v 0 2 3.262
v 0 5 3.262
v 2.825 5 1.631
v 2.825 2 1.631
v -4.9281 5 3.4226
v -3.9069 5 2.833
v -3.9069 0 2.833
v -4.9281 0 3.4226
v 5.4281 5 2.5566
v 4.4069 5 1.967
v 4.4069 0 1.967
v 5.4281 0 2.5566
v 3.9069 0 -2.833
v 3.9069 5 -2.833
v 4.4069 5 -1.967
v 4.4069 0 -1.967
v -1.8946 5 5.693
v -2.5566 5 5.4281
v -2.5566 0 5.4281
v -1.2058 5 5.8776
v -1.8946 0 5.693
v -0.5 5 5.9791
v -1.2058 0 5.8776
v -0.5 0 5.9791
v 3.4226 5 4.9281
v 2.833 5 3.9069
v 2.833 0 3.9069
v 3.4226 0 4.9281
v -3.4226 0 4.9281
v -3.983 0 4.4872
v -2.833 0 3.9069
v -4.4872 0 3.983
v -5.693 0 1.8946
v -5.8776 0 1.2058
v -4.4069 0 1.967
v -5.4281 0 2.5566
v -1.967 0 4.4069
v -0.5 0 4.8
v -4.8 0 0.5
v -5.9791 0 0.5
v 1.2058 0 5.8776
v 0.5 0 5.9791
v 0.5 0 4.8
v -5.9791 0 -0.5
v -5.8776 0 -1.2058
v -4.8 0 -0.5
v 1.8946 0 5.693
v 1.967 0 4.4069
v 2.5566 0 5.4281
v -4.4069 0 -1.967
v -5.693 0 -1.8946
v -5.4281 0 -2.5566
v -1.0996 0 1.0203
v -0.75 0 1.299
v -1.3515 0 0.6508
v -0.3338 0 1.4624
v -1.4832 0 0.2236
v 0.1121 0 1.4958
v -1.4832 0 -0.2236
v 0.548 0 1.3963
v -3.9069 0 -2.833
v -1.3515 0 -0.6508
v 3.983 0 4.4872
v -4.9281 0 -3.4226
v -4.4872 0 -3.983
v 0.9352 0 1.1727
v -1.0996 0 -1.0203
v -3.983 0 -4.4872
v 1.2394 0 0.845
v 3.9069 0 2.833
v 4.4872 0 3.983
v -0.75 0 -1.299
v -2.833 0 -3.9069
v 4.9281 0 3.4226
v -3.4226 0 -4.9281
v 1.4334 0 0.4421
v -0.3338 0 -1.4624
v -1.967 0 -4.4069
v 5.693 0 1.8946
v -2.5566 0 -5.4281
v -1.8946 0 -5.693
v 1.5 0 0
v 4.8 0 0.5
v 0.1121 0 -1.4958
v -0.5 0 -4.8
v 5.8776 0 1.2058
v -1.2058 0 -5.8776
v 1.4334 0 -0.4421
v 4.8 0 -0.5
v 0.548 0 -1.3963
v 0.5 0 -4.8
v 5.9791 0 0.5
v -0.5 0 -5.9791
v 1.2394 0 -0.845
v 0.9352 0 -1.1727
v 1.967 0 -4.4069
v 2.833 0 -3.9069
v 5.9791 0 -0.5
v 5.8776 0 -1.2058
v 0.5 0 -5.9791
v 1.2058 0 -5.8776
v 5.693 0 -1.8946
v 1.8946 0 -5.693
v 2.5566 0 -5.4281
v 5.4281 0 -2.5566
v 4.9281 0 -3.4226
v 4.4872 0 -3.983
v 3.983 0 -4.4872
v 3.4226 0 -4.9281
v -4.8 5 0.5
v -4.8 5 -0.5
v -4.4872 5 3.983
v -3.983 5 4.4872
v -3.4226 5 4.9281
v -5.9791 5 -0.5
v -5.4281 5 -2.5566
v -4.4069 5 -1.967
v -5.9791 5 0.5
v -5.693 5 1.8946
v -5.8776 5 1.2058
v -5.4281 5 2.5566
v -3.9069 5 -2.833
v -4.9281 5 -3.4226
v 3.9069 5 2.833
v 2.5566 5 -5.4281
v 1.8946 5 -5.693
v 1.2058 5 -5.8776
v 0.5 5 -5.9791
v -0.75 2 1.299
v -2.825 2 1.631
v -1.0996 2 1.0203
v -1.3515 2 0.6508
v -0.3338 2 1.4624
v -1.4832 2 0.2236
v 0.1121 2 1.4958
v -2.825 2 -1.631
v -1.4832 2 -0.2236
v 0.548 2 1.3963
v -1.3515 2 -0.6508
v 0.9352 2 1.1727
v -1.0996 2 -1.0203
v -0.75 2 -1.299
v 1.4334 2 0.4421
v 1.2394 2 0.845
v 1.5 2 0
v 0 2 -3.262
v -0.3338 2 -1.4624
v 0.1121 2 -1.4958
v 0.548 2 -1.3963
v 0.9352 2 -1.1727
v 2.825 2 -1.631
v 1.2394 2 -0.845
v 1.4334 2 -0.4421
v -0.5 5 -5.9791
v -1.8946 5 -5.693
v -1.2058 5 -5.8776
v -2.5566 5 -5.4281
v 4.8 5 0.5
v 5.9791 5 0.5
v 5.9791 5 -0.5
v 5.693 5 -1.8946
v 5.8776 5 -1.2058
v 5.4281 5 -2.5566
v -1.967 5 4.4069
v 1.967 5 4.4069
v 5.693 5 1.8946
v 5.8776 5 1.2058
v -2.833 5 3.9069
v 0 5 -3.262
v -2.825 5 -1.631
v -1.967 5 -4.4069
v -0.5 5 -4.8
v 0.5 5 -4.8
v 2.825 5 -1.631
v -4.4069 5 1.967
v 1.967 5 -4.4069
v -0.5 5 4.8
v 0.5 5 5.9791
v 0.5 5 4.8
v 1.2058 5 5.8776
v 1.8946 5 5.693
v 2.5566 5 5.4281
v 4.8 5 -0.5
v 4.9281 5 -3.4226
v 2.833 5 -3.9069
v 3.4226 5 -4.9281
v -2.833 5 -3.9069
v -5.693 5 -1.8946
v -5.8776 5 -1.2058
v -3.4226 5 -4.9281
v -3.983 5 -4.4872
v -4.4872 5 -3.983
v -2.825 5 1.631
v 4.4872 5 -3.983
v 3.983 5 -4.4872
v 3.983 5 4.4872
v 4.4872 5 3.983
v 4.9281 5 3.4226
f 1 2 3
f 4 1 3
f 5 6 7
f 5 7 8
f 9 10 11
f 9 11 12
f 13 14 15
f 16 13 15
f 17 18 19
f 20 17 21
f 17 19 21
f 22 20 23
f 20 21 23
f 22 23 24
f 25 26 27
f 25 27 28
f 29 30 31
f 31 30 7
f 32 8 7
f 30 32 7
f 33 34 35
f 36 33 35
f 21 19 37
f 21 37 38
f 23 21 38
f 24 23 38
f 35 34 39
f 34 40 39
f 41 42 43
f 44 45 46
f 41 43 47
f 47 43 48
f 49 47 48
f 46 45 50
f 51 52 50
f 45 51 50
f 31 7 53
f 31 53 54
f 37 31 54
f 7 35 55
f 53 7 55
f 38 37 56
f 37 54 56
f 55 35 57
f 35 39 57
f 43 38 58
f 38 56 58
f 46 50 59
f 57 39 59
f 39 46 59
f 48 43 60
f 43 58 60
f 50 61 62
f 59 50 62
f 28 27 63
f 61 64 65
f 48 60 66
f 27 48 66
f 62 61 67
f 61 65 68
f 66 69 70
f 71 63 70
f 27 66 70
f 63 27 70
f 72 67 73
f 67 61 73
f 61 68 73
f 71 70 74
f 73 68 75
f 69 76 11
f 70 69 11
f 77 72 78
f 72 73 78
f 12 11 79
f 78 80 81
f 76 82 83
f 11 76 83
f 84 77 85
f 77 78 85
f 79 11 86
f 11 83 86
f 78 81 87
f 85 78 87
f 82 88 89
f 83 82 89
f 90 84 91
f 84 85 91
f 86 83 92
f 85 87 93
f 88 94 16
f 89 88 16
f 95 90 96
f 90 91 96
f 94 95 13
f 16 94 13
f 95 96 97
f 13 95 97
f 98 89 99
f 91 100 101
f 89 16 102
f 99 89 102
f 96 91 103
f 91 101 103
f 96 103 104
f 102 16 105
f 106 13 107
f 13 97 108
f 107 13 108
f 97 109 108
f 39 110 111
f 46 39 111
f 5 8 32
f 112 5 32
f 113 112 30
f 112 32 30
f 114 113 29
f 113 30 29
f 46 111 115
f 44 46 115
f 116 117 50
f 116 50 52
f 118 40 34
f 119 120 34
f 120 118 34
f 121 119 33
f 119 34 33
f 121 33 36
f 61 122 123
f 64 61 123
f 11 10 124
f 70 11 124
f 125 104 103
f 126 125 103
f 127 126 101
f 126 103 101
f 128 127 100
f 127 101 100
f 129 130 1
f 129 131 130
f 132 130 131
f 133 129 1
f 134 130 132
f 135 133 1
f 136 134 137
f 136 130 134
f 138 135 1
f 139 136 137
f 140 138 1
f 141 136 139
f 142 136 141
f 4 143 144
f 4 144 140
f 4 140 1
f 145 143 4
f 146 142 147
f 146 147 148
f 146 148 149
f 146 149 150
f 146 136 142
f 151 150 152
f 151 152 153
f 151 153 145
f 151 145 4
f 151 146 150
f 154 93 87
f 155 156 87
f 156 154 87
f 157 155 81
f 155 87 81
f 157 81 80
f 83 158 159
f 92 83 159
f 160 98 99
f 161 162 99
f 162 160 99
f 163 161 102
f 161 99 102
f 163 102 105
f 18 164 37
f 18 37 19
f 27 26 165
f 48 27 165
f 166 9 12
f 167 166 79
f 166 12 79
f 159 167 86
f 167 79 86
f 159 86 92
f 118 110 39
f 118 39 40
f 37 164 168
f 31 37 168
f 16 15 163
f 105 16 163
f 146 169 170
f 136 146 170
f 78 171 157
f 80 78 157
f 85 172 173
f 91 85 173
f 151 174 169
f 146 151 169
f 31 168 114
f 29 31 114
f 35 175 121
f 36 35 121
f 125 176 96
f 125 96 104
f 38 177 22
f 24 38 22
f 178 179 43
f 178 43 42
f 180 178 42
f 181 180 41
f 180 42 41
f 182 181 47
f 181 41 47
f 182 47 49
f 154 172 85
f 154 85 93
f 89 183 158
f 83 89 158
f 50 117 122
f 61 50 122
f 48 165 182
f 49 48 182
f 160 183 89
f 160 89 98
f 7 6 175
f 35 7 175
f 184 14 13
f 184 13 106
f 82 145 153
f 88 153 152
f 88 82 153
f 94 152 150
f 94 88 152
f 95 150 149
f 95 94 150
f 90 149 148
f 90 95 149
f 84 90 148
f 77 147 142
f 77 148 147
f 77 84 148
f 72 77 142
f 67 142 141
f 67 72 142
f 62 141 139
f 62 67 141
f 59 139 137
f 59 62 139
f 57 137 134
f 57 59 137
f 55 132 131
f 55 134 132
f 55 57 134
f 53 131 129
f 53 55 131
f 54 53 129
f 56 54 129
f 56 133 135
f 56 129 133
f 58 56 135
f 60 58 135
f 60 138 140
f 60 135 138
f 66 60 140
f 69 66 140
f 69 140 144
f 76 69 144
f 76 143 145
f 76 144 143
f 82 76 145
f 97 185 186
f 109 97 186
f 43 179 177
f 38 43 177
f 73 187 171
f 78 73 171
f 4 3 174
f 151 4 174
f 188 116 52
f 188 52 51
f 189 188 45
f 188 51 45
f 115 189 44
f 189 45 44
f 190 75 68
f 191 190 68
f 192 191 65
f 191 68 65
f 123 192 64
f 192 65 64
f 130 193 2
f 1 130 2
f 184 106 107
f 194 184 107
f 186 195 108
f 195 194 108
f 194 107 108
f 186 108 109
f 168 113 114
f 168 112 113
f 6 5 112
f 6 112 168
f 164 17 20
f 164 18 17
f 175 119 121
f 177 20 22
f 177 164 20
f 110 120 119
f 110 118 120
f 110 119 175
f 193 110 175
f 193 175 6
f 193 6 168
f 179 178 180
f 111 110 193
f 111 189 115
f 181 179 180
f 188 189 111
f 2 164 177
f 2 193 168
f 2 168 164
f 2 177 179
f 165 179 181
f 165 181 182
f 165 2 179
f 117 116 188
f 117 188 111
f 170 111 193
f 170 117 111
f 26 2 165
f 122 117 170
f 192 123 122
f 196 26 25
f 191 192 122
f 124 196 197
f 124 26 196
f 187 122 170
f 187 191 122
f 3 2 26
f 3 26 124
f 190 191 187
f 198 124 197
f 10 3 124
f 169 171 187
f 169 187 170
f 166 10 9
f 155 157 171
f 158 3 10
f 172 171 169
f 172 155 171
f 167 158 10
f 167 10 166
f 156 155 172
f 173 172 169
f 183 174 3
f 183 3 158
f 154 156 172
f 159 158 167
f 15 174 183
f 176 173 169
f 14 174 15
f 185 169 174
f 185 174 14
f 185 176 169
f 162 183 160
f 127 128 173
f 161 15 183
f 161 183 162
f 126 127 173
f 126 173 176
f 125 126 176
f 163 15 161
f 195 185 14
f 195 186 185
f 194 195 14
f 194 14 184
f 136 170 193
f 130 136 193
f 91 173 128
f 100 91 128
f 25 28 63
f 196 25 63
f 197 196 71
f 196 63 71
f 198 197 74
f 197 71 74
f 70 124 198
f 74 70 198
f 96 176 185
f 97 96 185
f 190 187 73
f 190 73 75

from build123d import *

# Parameters (mm, degrees)
SKETCH1_R           = 6
SKETCH1_R_2         = 1.5
BOSS_EXTRUDE1_DEPTH = 5
CUT_EXTRUDE1_DEPTH  = 3
SKETCH7_W           = 1
SKETCH7_H           = 7.146818719
CUT_EXTRUDE2_DEPTH  = 10
CIRPATTERN1_COUNT   = 12


with BuildPart() as part:
    # Sketch1 → Boss-Extrude1 (new body)
    with BuildSketch(Plane(origin=(0, 0, 0), x_dir=(1, 0, 0), z_dir=(0, 1, 0))):
        Circle(SKETCH1_R)
        Circle(SKETCH1_R_2, mode=Mode.SUBTRACT)
    extrude(amount=BOSS_EXTRUDE1_DEPTH)

    # Sketch6 → Cut-Extrude1 (cut)
    with BuildSketch(Plane(origin=(0, 5, 0), x_dir=(1, 0, 0), z_dir=(0, 1, 0))):
        Polygon((2.825, -1.63101451), (2.825, 1.63101451), (0, 3.262029021), (-2.825, 1.63101451), (-2.825, -1.63101451), (0, -3.262029021), align=None)
    extrude(amount=-CUT_EXTRUDE1_DEPTH, mode=Mode.SUBTRACT)

    # Sketch7 → Cut-Extrude2 (cut)
    with BuildSketch(Plane(origin=(0, 5, 0), x_dir=(1, 0, 0), z_dir=(0, 1, 0))):
        with Locations((0, 8.37340936)):
            Rectangle(SKETCH7_W, SKETCH7_H)
    cut_extrude2 = extrude(amount=-CUT_EXTRUDE2_DEPTH, mode=Mode.SUBTRACT)

    # CirPattern1: Cut-Extrude2 ×12 about axis
    cirpattern1_axis = Axis((0, 0, 0), (0, 1, 0))
    for i in range(1, CIRPATTERN1_COUNT):
        add(cut_extrude2.rotate(cirpattern1_axis, i * 360 / CIRPATTERN1_COUNT), mode=Mode.SUBTRACT)


solid = part.part
